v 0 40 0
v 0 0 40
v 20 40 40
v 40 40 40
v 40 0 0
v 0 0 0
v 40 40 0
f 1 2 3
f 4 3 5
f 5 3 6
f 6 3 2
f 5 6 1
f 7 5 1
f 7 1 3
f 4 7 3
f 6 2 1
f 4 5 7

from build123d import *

# Parameters (mm, degrees)
F1_DEPTH = 40
F3_DEPTH = 40
F6_DEPTH = 16.3309316186


with BuildPart() as f1:
    # F0 (on Right) → F1 (new body)
    with BuildSketch(Plane.YZ):
        Polygon((40, 40), (0, 0), (40, 0), align=None)
    extrude(amount=F1_DEPTH)

    # F2 (on face) → F3 (join)
    with BuildSketch(Plane(origin=(0, 0, 0), x_dir=(1, 0, 0), z_dir=(0, 0, -1))):
        Polygon((20, -40), (0, 0), (0, -40), align=None)
    extrude(amount=-F3_DEPTH)

    # F5 (on 3pt) → F6 (cut, through all)
    with BuildSketch(Plane(origin=(-13.3333333333, 6.6666666667, 6.6666666667), x_dir=(0.3651483717, 0.9128709292, -0.1825741858), z_dir=(0.8164965809, -0.4082482905, -0.4082482905))):
        Polygon((36.514837167, 0), (36.514837167, 44.72135955), (-7.3029674334, 35.77708764), align=None)
    extrude(amount=-F6_DEPTH, mode=Mode.SUBTRACT)


solid = f1.part
